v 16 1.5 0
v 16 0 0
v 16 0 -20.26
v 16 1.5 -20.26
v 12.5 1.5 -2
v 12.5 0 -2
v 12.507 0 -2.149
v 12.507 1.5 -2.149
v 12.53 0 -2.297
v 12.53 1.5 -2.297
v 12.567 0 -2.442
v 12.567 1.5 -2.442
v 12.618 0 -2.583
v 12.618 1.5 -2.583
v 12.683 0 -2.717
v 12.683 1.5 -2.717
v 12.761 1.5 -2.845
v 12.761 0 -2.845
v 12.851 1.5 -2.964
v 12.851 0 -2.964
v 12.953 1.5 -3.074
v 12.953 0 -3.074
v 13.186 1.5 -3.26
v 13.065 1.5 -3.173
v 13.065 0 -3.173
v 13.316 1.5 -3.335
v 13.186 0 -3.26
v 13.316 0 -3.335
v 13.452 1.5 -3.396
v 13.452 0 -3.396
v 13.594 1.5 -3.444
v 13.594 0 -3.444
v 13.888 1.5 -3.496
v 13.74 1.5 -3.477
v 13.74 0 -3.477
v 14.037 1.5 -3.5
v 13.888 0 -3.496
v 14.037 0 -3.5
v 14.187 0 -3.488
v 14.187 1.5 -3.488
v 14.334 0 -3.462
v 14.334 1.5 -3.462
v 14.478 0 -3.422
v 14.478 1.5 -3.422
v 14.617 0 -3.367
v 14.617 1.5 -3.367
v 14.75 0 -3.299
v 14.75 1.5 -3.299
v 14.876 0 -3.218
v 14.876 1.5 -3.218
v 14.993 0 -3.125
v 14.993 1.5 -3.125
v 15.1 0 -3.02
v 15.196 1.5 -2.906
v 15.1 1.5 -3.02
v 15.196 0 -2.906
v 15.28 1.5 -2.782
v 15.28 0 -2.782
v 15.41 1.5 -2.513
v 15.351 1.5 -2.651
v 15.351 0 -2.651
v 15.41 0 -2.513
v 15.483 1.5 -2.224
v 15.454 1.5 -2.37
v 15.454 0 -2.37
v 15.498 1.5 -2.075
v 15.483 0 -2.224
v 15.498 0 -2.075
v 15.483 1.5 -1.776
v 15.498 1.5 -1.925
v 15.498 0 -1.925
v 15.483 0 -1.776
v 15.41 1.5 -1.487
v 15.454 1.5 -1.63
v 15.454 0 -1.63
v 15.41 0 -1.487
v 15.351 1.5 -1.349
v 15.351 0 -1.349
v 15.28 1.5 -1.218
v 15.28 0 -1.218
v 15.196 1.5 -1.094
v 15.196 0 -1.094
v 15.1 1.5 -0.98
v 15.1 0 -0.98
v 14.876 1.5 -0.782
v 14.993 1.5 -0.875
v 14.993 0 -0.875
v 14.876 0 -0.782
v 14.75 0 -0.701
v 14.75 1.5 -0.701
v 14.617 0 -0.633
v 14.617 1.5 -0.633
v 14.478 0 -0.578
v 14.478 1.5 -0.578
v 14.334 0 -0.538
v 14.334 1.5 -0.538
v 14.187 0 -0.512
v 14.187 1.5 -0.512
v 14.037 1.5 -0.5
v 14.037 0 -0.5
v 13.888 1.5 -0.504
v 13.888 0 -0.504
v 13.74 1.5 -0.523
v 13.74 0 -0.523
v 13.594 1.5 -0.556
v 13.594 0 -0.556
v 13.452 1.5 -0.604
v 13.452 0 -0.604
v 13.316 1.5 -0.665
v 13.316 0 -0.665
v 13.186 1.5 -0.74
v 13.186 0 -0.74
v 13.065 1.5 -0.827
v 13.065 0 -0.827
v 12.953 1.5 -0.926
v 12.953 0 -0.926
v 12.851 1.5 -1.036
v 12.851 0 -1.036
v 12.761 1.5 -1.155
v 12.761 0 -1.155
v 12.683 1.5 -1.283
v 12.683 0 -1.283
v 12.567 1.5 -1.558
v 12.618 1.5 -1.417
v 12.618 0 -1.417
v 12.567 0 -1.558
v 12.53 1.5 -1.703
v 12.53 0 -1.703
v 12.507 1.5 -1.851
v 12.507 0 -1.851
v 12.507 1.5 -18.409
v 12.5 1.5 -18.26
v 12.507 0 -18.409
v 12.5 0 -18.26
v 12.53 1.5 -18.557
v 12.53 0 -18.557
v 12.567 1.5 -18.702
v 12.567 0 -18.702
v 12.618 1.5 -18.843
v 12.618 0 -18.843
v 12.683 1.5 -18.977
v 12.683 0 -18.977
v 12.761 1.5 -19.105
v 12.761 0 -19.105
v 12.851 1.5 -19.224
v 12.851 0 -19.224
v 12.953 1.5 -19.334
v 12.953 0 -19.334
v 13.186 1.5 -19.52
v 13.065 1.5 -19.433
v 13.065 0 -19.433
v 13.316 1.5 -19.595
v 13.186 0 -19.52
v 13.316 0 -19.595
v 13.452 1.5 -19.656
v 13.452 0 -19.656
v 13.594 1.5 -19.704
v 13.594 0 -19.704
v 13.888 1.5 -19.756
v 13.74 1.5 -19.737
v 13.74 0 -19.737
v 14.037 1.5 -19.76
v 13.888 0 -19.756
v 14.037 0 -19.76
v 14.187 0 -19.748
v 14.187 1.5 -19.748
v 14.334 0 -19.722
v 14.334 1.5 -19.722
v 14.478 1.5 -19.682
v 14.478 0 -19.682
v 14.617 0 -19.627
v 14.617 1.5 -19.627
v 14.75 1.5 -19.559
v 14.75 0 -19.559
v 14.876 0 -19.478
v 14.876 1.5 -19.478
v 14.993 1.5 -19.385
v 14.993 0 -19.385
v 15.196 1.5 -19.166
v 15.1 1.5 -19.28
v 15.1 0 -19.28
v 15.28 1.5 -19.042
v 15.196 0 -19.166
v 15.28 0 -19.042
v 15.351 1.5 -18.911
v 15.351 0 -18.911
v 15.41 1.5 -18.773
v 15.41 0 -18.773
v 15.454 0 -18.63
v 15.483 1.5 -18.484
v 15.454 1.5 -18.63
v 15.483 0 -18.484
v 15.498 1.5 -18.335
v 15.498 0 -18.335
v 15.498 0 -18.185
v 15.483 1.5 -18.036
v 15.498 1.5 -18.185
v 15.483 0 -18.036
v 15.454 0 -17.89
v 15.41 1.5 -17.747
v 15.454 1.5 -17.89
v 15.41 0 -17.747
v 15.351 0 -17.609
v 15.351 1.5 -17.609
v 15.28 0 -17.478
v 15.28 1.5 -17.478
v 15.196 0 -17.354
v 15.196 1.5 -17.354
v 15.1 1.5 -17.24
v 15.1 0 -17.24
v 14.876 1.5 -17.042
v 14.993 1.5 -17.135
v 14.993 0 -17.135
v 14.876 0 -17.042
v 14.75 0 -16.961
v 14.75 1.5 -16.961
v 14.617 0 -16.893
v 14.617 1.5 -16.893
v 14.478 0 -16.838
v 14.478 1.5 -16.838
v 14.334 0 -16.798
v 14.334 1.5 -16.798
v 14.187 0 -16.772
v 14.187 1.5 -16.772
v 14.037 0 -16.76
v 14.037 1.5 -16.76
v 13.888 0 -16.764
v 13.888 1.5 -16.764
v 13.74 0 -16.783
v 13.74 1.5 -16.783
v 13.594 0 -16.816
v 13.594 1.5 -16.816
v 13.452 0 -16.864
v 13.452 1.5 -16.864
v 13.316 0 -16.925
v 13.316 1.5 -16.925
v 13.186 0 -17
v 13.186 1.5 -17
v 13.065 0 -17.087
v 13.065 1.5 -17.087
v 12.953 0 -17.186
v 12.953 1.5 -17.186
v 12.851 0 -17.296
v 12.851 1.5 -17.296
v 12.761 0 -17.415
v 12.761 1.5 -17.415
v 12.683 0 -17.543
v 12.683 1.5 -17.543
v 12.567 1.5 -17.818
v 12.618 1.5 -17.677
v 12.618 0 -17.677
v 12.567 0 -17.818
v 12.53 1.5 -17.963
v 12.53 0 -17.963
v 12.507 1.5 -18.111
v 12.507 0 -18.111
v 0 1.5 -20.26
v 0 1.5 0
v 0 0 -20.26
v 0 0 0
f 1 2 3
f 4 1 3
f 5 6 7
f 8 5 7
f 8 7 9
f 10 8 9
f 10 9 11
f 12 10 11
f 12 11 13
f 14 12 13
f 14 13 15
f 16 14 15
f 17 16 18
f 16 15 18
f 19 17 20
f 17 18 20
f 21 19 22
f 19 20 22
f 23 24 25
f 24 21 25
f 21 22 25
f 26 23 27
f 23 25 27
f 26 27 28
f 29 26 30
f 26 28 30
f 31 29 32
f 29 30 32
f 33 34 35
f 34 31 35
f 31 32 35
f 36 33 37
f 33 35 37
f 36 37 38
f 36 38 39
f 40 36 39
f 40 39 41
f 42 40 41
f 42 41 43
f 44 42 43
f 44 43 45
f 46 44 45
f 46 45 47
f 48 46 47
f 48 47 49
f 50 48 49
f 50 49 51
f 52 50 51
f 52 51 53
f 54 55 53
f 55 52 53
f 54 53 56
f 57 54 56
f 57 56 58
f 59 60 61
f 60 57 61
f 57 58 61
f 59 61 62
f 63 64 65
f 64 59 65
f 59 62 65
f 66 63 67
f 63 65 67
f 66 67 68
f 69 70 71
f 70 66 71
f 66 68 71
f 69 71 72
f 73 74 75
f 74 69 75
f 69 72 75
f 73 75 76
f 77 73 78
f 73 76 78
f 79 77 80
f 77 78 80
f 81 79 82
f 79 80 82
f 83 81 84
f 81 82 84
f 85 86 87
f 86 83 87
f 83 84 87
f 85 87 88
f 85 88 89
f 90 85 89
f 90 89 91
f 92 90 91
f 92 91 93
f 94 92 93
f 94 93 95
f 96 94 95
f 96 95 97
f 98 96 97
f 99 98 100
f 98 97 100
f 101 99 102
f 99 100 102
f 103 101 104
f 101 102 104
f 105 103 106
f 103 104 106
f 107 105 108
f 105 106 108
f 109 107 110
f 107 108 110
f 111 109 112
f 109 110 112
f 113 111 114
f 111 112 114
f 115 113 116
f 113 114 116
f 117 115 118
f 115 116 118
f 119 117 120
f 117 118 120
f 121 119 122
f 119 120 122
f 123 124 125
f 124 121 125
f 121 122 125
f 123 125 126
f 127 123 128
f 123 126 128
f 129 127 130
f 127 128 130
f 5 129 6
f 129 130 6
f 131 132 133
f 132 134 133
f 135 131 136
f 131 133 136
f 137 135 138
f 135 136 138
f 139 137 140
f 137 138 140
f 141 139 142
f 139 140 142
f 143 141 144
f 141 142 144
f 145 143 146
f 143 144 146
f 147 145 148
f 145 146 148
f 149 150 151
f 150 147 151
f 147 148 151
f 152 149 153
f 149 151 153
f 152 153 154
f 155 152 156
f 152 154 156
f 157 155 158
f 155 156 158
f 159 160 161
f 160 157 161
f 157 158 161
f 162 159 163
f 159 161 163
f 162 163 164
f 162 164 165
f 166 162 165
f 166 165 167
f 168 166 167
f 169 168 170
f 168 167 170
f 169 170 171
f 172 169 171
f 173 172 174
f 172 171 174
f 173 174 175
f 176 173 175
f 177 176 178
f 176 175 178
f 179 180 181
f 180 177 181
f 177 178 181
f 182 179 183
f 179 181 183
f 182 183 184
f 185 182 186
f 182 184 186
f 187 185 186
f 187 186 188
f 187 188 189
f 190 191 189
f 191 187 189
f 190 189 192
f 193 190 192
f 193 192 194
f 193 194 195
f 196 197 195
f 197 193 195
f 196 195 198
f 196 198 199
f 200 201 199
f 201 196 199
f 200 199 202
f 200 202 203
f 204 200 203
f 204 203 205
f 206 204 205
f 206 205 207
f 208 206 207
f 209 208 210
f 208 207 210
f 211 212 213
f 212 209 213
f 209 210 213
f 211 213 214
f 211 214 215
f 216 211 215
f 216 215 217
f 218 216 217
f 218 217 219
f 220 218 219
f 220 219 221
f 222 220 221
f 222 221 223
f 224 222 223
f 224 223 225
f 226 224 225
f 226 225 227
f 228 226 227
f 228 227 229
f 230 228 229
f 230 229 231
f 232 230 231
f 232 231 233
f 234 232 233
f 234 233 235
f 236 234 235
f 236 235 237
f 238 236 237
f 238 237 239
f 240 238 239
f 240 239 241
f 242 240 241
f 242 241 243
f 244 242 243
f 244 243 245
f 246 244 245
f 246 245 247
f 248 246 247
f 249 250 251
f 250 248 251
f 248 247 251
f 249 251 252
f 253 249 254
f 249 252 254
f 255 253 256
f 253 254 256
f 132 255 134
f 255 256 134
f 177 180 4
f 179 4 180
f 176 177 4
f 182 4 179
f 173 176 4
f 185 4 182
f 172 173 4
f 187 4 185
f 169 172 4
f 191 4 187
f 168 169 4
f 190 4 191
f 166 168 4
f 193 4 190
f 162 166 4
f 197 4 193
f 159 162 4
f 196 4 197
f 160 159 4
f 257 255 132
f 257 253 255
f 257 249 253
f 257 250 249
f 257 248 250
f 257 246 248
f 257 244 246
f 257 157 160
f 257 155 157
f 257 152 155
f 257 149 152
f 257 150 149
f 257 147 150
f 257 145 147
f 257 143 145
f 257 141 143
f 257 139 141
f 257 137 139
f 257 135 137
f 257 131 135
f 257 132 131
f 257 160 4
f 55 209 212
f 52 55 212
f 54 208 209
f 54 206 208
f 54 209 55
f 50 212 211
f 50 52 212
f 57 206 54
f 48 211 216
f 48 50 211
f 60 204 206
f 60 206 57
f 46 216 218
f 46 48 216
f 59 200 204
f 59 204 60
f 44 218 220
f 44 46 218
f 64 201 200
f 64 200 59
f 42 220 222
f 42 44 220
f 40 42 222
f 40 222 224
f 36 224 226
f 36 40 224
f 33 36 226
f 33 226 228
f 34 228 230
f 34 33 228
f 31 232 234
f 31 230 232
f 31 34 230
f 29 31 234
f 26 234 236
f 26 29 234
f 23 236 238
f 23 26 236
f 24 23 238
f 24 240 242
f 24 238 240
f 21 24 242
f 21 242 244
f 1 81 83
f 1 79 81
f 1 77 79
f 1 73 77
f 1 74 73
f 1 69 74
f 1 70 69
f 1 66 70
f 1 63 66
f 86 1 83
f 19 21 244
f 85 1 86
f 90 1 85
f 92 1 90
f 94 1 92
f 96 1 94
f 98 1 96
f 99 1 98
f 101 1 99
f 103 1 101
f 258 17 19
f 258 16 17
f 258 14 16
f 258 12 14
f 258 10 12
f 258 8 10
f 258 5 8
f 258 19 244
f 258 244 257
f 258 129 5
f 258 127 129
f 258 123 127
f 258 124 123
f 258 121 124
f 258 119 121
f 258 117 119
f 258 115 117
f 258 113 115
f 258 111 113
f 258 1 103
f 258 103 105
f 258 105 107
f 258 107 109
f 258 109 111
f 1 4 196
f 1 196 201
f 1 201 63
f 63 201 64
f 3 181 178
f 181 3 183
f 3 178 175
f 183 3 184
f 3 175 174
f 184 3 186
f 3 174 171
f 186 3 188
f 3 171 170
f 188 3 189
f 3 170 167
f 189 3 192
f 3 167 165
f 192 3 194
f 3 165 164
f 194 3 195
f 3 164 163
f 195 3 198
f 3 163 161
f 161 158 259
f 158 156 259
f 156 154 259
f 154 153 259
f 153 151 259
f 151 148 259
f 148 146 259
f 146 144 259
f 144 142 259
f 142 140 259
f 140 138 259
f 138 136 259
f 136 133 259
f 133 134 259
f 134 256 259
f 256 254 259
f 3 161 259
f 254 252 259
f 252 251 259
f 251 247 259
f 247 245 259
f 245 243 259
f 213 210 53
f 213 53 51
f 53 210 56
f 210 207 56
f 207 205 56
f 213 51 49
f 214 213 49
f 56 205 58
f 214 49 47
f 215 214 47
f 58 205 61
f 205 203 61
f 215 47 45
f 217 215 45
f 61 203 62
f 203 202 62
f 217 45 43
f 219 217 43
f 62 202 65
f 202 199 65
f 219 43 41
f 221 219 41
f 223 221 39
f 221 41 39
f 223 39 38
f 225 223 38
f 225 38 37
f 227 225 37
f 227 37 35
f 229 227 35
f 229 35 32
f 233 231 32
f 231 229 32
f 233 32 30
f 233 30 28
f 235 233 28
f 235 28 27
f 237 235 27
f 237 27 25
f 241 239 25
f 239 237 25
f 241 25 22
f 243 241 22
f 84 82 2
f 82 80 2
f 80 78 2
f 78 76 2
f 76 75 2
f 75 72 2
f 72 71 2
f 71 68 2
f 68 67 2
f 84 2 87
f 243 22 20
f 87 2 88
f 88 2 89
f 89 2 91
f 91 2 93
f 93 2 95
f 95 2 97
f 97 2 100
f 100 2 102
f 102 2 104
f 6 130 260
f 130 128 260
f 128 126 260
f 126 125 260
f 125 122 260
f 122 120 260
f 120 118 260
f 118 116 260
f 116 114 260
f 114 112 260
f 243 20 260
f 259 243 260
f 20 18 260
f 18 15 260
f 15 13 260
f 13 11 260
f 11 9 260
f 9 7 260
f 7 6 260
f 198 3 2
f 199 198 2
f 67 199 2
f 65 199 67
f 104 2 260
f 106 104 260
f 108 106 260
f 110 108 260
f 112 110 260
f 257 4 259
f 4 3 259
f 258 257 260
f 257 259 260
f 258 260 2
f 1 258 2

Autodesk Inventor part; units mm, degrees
ref_plane "YZ Plane" through (0, 0, 0) normal (1, 0, 0) x (0, 1, 0)
ref_plane "XZ Plane" through (0, 0, 0) normal (0, 1, 0) x (-1, 0, 0)
ref_plane "XY Plane" through (0, 0, 0) normal (0, 0, 1) x (1, 0, 0)
sketch "Sketch1" plane through (0, 0, 0) normal (0, 1, 0) x (-1, 0, 0)
  line L0 (0, 0) -> (-16, 0)
  line L1 (-16, 0) -> (-16, -20.26)
  line L2 (-16, -20.26) -> (0, -20.26)
  line L3 (0, -20.26) -> (0, 0)
  circle A0 centre (-14, -18.26) radius 1.5
  circle A1 centre (-14, -2) radius 1.5
  dimension "d0" = 20.26
  dimension "d1" = 16
  dimension "d2" = 3
  dimension "d3" = 2
  dimension "d4" = 2
  dimension "d5" = 2
extrude "Extrusion1" add sketch "Sketch1" along normal blind 1.5
properties part number "IMU SENSOR"
